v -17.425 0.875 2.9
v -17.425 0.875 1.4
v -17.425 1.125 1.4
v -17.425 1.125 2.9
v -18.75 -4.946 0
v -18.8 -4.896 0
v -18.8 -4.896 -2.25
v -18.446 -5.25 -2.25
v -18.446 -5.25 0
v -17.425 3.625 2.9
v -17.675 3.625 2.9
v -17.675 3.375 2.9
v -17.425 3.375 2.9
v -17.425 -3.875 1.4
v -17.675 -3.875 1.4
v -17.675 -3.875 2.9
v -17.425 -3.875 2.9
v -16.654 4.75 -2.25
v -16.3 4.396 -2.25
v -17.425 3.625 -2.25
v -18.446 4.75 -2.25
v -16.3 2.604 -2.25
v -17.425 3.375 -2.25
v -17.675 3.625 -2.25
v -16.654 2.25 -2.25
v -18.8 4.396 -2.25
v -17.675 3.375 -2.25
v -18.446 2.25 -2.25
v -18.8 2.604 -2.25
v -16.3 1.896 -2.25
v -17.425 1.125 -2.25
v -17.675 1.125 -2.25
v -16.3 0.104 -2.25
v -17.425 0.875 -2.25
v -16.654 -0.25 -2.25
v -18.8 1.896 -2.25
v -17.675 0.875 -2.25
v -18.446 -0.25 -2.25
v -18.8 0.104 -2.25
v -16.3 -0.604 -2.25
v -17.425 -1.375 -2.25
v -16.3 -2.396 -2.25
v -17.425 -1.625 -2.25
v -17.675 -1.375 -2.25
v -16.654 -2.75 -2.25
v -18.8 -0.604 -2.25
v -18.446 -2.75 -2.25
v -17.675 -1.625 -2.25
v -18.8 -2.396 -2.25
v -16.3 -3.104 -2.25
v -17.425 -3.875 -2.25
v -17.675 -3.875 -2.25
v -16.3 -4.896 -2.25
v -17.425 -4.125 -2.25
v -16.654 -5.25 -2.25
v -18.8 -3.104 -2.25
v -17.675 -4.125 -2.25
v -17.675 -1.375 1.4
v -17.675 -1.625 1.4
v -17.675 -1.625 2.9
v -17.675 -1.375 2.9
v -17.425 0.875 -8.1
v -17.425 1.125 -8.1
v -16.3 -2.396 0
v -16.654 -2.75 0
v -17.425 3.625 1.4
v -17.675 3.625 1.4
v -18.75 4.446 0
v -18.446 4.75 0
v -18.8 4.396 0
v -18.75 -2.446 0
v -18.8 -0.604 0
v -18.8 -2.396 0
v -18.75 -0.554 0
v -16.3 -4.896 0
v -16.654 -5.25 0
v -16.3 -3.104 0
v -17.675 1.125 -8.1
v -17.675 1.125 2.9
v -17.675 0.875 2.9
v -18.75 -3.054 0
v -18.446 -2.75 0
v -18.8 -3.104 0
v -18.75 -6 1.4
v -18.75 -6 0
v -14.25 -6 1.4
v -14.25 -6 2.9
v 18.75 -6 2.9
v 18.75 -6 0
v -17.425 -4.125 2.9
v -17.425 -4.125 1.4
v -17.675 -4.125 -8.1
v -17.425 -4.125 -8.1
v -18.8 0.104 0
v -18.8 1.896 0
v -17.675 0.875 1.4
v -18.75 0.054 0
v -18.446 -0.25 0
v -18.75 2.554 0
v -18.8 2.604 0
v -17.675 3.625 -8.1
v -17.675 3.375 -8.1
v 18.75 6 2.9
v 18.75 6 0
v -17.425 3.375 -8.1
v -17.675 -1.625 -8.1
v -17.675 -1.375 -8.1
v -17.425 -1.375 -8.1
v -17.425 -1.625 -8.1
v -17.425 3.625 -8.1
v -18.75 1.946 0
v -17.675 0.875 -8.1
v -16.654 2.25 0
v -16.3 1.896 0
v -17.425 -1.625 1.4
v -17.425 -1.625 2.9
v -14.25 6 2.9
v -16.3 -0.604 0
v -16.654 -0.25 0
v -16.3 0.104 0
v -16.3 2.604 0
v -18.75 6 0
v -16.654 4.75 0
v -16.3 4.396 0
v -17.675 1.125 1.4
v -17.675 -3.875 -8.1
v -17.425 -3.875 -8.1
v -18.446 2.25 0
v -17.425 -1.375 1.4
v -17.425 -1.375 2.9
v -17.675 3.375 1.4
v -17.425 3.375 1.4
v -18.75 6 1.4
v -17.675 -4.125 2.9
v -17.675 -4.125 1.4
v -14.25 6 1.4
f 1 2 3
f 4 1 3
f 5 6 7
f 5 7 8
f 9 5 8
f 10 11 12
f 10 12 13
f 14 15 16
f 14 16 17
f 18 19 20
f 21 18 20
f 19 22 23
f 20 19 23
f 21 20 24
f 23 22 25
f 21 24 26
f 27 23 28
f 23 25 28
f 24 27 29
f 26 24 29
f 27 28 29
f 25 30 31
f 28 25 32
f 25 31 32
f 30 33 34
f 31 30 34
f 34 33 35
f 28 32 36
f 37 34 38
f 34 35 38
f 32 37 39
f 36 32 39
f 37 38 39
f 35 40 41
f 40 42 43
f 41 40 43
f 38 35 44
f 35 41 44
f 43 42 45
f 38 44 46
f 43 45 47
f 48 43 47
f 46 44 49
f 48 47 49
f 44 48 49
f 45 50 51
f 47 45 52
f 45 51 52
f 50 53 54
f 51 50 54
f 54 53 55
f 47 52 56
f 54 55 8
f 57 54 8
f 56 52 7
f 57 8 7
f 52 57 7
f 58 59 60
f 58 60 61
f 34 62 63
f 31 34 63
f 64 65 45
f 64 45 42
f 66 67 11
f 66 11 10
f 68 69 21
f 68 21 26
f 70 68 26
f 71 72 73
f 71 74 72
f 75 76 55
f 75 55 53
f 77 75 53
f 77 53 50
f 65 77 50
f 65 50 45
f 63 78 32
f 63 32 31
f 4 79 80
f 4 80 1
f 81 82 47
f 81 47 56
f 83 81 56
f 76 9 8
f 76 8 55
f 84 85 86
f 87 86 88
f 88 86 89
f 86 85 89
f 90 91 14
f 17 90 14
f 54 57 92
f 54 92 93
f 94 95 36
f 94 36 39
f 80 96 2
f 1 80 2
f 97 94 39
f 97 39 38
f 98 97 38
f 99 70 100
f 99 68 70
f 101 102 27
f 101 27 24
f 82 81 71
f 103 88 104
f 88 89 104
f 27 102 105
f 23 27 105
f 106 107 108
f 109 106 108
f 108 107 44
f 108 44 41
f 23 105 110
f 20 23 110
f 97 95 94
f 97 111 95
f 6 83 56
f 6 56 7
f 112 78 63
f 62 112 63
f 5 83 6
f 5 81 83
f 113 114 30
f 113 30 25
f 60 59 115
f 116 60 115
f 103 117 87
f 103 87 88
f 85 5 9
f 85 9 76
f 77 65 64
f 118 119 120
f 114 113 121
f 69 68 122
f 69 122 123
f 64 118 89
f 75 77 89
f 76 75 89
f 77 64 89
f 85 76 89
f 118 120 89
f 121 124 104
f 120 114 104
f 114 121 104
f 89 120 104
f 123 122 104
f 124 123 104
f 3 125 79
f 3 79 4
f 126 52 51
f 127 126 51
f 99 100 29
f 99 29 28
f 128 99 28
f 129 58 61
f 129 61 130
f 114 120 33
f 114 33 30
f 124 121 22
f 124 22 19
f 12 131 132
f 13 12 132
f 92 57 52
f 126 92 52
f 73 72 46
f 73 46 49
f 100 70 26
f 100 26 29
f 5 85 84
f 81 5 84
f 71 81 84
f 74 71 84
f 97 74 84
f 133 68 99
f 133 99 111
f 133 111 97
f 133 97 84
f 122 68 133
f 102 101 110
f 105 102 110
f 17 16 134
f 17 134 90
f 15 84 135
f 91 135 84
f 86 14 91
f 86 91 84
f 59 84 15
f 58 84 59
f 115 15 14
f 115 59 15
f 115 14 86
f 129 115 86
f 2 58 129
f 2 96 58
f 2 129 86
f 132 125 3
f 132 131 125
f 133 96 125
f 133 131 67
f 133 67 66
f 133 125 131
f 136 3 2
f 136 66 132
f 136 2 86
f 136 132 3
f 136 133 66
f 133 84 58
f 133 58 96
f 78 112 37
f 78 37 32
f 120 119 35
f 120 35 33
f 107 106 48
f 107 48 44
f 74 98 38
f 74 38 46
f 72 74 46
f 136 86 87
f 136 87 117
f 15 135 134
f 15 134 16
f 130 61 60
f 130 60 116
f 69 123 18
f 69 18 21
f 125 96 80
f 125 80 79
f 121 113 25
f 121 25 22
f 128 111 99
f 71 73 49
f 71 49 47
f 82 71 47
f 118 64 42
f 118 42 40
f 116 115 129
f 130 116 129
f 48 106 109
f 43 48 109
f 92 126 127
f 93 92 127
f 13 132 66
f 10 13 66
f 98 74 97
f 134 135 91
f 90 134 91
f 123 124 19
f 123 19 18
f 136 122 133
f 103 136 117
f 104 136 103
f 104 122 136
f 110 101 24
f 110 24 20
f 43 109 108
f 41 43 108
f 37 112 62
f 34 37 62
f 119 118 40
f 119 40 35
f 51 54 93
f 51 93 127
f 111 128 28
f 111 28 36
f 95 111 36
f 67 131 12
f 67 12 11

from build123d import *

# Parameters (mm, degrees)
SKETCH_W               = 37.5
SKETCH_H               = 12
PAD_DEPTH              = 1.4
SKETCH001_W            = 33
SKETCH001_H            = 12
PAD001_DEPTH           = 1.5
SKETCH002_W            = 0.25
SKETCH002_H            = 0.25
PAD002_DEPTH           = 1.5
PAD002_DEPTH_BACK      = 9.5
LINEARPATTERN_COUNT    = 4
LINEARPATTERN_PITCH    = 2.5
PAD003_DEPTH           = 2.25
LINEARPATTERN001_COUNT = 4
LINEARPATTERN001_PITCH = 2.5


with BuildPart() as part:
    # Sketch → Pad (new body)
    with BuildSketch(Plane.XY):
        Rectangle(SKETCH_W, SKETCH_H)
    extrude(amount=PAD_DEPTH)

    # Sketch001 (on Face6 of Pad) → Pad001 (join)
    with BuildSketch(Plane.XY.offset(1.4)):
        with Locations((2.25, 0)):
            Rectangle(SKETCH001_W, SKETCH001_H)
    extrude(amount=PAD001_DEPTH)

    # Sketch002 (on Face5 of Pad001) → Pad002 (join, two sides)
    with BuildSketch(Plane.XY.offset(1.4)) as pad002_sk:
        with Locations((-17.55, -4)):
            Rectangle(SKETCH002_W, SKETCH002_H)
    pad002 = extrude(amount=PAD002_DEPTH) + extrude(pad002_sk.sketch, amount=-PAD002_DEPTH_BACK)

    # LinearPattern: Pad002 ×4
    with Locations(*[(0, i * LINEARPATTERN_PITCH, 0) for i in range(1, LINEARPATTERN_COUNT)]):
        add(pad002)

    # Sketch003 (on Face4 of LinearPattern) → Pad003 (join)
    with BuildSketch(Plane(origin=(0, 0, 0), x_dir=(1, 0, 0), z_dir=(0, 0, -1))):
        Polygon((-18.8, 4.896447), (-18.446447, 5.25), (-16.653553, 5.25), (-16.3, 4.896447), (-16.3, 3.103553), (-16.653553, 2.75), (-18.446447, 2.75), (-18.8, 3.103553), align=None)
    pad003 = extrude(amount=PAD003_DEPTH)

    # LinearPattern001: Pad003 ×4
    with Locations(*[(0, i * LINEARPATTERN001_PITCH, 0) for i in range(1, LINEARPATTERN001_COUNT)]):
        add(pad003)


solid = part.part
